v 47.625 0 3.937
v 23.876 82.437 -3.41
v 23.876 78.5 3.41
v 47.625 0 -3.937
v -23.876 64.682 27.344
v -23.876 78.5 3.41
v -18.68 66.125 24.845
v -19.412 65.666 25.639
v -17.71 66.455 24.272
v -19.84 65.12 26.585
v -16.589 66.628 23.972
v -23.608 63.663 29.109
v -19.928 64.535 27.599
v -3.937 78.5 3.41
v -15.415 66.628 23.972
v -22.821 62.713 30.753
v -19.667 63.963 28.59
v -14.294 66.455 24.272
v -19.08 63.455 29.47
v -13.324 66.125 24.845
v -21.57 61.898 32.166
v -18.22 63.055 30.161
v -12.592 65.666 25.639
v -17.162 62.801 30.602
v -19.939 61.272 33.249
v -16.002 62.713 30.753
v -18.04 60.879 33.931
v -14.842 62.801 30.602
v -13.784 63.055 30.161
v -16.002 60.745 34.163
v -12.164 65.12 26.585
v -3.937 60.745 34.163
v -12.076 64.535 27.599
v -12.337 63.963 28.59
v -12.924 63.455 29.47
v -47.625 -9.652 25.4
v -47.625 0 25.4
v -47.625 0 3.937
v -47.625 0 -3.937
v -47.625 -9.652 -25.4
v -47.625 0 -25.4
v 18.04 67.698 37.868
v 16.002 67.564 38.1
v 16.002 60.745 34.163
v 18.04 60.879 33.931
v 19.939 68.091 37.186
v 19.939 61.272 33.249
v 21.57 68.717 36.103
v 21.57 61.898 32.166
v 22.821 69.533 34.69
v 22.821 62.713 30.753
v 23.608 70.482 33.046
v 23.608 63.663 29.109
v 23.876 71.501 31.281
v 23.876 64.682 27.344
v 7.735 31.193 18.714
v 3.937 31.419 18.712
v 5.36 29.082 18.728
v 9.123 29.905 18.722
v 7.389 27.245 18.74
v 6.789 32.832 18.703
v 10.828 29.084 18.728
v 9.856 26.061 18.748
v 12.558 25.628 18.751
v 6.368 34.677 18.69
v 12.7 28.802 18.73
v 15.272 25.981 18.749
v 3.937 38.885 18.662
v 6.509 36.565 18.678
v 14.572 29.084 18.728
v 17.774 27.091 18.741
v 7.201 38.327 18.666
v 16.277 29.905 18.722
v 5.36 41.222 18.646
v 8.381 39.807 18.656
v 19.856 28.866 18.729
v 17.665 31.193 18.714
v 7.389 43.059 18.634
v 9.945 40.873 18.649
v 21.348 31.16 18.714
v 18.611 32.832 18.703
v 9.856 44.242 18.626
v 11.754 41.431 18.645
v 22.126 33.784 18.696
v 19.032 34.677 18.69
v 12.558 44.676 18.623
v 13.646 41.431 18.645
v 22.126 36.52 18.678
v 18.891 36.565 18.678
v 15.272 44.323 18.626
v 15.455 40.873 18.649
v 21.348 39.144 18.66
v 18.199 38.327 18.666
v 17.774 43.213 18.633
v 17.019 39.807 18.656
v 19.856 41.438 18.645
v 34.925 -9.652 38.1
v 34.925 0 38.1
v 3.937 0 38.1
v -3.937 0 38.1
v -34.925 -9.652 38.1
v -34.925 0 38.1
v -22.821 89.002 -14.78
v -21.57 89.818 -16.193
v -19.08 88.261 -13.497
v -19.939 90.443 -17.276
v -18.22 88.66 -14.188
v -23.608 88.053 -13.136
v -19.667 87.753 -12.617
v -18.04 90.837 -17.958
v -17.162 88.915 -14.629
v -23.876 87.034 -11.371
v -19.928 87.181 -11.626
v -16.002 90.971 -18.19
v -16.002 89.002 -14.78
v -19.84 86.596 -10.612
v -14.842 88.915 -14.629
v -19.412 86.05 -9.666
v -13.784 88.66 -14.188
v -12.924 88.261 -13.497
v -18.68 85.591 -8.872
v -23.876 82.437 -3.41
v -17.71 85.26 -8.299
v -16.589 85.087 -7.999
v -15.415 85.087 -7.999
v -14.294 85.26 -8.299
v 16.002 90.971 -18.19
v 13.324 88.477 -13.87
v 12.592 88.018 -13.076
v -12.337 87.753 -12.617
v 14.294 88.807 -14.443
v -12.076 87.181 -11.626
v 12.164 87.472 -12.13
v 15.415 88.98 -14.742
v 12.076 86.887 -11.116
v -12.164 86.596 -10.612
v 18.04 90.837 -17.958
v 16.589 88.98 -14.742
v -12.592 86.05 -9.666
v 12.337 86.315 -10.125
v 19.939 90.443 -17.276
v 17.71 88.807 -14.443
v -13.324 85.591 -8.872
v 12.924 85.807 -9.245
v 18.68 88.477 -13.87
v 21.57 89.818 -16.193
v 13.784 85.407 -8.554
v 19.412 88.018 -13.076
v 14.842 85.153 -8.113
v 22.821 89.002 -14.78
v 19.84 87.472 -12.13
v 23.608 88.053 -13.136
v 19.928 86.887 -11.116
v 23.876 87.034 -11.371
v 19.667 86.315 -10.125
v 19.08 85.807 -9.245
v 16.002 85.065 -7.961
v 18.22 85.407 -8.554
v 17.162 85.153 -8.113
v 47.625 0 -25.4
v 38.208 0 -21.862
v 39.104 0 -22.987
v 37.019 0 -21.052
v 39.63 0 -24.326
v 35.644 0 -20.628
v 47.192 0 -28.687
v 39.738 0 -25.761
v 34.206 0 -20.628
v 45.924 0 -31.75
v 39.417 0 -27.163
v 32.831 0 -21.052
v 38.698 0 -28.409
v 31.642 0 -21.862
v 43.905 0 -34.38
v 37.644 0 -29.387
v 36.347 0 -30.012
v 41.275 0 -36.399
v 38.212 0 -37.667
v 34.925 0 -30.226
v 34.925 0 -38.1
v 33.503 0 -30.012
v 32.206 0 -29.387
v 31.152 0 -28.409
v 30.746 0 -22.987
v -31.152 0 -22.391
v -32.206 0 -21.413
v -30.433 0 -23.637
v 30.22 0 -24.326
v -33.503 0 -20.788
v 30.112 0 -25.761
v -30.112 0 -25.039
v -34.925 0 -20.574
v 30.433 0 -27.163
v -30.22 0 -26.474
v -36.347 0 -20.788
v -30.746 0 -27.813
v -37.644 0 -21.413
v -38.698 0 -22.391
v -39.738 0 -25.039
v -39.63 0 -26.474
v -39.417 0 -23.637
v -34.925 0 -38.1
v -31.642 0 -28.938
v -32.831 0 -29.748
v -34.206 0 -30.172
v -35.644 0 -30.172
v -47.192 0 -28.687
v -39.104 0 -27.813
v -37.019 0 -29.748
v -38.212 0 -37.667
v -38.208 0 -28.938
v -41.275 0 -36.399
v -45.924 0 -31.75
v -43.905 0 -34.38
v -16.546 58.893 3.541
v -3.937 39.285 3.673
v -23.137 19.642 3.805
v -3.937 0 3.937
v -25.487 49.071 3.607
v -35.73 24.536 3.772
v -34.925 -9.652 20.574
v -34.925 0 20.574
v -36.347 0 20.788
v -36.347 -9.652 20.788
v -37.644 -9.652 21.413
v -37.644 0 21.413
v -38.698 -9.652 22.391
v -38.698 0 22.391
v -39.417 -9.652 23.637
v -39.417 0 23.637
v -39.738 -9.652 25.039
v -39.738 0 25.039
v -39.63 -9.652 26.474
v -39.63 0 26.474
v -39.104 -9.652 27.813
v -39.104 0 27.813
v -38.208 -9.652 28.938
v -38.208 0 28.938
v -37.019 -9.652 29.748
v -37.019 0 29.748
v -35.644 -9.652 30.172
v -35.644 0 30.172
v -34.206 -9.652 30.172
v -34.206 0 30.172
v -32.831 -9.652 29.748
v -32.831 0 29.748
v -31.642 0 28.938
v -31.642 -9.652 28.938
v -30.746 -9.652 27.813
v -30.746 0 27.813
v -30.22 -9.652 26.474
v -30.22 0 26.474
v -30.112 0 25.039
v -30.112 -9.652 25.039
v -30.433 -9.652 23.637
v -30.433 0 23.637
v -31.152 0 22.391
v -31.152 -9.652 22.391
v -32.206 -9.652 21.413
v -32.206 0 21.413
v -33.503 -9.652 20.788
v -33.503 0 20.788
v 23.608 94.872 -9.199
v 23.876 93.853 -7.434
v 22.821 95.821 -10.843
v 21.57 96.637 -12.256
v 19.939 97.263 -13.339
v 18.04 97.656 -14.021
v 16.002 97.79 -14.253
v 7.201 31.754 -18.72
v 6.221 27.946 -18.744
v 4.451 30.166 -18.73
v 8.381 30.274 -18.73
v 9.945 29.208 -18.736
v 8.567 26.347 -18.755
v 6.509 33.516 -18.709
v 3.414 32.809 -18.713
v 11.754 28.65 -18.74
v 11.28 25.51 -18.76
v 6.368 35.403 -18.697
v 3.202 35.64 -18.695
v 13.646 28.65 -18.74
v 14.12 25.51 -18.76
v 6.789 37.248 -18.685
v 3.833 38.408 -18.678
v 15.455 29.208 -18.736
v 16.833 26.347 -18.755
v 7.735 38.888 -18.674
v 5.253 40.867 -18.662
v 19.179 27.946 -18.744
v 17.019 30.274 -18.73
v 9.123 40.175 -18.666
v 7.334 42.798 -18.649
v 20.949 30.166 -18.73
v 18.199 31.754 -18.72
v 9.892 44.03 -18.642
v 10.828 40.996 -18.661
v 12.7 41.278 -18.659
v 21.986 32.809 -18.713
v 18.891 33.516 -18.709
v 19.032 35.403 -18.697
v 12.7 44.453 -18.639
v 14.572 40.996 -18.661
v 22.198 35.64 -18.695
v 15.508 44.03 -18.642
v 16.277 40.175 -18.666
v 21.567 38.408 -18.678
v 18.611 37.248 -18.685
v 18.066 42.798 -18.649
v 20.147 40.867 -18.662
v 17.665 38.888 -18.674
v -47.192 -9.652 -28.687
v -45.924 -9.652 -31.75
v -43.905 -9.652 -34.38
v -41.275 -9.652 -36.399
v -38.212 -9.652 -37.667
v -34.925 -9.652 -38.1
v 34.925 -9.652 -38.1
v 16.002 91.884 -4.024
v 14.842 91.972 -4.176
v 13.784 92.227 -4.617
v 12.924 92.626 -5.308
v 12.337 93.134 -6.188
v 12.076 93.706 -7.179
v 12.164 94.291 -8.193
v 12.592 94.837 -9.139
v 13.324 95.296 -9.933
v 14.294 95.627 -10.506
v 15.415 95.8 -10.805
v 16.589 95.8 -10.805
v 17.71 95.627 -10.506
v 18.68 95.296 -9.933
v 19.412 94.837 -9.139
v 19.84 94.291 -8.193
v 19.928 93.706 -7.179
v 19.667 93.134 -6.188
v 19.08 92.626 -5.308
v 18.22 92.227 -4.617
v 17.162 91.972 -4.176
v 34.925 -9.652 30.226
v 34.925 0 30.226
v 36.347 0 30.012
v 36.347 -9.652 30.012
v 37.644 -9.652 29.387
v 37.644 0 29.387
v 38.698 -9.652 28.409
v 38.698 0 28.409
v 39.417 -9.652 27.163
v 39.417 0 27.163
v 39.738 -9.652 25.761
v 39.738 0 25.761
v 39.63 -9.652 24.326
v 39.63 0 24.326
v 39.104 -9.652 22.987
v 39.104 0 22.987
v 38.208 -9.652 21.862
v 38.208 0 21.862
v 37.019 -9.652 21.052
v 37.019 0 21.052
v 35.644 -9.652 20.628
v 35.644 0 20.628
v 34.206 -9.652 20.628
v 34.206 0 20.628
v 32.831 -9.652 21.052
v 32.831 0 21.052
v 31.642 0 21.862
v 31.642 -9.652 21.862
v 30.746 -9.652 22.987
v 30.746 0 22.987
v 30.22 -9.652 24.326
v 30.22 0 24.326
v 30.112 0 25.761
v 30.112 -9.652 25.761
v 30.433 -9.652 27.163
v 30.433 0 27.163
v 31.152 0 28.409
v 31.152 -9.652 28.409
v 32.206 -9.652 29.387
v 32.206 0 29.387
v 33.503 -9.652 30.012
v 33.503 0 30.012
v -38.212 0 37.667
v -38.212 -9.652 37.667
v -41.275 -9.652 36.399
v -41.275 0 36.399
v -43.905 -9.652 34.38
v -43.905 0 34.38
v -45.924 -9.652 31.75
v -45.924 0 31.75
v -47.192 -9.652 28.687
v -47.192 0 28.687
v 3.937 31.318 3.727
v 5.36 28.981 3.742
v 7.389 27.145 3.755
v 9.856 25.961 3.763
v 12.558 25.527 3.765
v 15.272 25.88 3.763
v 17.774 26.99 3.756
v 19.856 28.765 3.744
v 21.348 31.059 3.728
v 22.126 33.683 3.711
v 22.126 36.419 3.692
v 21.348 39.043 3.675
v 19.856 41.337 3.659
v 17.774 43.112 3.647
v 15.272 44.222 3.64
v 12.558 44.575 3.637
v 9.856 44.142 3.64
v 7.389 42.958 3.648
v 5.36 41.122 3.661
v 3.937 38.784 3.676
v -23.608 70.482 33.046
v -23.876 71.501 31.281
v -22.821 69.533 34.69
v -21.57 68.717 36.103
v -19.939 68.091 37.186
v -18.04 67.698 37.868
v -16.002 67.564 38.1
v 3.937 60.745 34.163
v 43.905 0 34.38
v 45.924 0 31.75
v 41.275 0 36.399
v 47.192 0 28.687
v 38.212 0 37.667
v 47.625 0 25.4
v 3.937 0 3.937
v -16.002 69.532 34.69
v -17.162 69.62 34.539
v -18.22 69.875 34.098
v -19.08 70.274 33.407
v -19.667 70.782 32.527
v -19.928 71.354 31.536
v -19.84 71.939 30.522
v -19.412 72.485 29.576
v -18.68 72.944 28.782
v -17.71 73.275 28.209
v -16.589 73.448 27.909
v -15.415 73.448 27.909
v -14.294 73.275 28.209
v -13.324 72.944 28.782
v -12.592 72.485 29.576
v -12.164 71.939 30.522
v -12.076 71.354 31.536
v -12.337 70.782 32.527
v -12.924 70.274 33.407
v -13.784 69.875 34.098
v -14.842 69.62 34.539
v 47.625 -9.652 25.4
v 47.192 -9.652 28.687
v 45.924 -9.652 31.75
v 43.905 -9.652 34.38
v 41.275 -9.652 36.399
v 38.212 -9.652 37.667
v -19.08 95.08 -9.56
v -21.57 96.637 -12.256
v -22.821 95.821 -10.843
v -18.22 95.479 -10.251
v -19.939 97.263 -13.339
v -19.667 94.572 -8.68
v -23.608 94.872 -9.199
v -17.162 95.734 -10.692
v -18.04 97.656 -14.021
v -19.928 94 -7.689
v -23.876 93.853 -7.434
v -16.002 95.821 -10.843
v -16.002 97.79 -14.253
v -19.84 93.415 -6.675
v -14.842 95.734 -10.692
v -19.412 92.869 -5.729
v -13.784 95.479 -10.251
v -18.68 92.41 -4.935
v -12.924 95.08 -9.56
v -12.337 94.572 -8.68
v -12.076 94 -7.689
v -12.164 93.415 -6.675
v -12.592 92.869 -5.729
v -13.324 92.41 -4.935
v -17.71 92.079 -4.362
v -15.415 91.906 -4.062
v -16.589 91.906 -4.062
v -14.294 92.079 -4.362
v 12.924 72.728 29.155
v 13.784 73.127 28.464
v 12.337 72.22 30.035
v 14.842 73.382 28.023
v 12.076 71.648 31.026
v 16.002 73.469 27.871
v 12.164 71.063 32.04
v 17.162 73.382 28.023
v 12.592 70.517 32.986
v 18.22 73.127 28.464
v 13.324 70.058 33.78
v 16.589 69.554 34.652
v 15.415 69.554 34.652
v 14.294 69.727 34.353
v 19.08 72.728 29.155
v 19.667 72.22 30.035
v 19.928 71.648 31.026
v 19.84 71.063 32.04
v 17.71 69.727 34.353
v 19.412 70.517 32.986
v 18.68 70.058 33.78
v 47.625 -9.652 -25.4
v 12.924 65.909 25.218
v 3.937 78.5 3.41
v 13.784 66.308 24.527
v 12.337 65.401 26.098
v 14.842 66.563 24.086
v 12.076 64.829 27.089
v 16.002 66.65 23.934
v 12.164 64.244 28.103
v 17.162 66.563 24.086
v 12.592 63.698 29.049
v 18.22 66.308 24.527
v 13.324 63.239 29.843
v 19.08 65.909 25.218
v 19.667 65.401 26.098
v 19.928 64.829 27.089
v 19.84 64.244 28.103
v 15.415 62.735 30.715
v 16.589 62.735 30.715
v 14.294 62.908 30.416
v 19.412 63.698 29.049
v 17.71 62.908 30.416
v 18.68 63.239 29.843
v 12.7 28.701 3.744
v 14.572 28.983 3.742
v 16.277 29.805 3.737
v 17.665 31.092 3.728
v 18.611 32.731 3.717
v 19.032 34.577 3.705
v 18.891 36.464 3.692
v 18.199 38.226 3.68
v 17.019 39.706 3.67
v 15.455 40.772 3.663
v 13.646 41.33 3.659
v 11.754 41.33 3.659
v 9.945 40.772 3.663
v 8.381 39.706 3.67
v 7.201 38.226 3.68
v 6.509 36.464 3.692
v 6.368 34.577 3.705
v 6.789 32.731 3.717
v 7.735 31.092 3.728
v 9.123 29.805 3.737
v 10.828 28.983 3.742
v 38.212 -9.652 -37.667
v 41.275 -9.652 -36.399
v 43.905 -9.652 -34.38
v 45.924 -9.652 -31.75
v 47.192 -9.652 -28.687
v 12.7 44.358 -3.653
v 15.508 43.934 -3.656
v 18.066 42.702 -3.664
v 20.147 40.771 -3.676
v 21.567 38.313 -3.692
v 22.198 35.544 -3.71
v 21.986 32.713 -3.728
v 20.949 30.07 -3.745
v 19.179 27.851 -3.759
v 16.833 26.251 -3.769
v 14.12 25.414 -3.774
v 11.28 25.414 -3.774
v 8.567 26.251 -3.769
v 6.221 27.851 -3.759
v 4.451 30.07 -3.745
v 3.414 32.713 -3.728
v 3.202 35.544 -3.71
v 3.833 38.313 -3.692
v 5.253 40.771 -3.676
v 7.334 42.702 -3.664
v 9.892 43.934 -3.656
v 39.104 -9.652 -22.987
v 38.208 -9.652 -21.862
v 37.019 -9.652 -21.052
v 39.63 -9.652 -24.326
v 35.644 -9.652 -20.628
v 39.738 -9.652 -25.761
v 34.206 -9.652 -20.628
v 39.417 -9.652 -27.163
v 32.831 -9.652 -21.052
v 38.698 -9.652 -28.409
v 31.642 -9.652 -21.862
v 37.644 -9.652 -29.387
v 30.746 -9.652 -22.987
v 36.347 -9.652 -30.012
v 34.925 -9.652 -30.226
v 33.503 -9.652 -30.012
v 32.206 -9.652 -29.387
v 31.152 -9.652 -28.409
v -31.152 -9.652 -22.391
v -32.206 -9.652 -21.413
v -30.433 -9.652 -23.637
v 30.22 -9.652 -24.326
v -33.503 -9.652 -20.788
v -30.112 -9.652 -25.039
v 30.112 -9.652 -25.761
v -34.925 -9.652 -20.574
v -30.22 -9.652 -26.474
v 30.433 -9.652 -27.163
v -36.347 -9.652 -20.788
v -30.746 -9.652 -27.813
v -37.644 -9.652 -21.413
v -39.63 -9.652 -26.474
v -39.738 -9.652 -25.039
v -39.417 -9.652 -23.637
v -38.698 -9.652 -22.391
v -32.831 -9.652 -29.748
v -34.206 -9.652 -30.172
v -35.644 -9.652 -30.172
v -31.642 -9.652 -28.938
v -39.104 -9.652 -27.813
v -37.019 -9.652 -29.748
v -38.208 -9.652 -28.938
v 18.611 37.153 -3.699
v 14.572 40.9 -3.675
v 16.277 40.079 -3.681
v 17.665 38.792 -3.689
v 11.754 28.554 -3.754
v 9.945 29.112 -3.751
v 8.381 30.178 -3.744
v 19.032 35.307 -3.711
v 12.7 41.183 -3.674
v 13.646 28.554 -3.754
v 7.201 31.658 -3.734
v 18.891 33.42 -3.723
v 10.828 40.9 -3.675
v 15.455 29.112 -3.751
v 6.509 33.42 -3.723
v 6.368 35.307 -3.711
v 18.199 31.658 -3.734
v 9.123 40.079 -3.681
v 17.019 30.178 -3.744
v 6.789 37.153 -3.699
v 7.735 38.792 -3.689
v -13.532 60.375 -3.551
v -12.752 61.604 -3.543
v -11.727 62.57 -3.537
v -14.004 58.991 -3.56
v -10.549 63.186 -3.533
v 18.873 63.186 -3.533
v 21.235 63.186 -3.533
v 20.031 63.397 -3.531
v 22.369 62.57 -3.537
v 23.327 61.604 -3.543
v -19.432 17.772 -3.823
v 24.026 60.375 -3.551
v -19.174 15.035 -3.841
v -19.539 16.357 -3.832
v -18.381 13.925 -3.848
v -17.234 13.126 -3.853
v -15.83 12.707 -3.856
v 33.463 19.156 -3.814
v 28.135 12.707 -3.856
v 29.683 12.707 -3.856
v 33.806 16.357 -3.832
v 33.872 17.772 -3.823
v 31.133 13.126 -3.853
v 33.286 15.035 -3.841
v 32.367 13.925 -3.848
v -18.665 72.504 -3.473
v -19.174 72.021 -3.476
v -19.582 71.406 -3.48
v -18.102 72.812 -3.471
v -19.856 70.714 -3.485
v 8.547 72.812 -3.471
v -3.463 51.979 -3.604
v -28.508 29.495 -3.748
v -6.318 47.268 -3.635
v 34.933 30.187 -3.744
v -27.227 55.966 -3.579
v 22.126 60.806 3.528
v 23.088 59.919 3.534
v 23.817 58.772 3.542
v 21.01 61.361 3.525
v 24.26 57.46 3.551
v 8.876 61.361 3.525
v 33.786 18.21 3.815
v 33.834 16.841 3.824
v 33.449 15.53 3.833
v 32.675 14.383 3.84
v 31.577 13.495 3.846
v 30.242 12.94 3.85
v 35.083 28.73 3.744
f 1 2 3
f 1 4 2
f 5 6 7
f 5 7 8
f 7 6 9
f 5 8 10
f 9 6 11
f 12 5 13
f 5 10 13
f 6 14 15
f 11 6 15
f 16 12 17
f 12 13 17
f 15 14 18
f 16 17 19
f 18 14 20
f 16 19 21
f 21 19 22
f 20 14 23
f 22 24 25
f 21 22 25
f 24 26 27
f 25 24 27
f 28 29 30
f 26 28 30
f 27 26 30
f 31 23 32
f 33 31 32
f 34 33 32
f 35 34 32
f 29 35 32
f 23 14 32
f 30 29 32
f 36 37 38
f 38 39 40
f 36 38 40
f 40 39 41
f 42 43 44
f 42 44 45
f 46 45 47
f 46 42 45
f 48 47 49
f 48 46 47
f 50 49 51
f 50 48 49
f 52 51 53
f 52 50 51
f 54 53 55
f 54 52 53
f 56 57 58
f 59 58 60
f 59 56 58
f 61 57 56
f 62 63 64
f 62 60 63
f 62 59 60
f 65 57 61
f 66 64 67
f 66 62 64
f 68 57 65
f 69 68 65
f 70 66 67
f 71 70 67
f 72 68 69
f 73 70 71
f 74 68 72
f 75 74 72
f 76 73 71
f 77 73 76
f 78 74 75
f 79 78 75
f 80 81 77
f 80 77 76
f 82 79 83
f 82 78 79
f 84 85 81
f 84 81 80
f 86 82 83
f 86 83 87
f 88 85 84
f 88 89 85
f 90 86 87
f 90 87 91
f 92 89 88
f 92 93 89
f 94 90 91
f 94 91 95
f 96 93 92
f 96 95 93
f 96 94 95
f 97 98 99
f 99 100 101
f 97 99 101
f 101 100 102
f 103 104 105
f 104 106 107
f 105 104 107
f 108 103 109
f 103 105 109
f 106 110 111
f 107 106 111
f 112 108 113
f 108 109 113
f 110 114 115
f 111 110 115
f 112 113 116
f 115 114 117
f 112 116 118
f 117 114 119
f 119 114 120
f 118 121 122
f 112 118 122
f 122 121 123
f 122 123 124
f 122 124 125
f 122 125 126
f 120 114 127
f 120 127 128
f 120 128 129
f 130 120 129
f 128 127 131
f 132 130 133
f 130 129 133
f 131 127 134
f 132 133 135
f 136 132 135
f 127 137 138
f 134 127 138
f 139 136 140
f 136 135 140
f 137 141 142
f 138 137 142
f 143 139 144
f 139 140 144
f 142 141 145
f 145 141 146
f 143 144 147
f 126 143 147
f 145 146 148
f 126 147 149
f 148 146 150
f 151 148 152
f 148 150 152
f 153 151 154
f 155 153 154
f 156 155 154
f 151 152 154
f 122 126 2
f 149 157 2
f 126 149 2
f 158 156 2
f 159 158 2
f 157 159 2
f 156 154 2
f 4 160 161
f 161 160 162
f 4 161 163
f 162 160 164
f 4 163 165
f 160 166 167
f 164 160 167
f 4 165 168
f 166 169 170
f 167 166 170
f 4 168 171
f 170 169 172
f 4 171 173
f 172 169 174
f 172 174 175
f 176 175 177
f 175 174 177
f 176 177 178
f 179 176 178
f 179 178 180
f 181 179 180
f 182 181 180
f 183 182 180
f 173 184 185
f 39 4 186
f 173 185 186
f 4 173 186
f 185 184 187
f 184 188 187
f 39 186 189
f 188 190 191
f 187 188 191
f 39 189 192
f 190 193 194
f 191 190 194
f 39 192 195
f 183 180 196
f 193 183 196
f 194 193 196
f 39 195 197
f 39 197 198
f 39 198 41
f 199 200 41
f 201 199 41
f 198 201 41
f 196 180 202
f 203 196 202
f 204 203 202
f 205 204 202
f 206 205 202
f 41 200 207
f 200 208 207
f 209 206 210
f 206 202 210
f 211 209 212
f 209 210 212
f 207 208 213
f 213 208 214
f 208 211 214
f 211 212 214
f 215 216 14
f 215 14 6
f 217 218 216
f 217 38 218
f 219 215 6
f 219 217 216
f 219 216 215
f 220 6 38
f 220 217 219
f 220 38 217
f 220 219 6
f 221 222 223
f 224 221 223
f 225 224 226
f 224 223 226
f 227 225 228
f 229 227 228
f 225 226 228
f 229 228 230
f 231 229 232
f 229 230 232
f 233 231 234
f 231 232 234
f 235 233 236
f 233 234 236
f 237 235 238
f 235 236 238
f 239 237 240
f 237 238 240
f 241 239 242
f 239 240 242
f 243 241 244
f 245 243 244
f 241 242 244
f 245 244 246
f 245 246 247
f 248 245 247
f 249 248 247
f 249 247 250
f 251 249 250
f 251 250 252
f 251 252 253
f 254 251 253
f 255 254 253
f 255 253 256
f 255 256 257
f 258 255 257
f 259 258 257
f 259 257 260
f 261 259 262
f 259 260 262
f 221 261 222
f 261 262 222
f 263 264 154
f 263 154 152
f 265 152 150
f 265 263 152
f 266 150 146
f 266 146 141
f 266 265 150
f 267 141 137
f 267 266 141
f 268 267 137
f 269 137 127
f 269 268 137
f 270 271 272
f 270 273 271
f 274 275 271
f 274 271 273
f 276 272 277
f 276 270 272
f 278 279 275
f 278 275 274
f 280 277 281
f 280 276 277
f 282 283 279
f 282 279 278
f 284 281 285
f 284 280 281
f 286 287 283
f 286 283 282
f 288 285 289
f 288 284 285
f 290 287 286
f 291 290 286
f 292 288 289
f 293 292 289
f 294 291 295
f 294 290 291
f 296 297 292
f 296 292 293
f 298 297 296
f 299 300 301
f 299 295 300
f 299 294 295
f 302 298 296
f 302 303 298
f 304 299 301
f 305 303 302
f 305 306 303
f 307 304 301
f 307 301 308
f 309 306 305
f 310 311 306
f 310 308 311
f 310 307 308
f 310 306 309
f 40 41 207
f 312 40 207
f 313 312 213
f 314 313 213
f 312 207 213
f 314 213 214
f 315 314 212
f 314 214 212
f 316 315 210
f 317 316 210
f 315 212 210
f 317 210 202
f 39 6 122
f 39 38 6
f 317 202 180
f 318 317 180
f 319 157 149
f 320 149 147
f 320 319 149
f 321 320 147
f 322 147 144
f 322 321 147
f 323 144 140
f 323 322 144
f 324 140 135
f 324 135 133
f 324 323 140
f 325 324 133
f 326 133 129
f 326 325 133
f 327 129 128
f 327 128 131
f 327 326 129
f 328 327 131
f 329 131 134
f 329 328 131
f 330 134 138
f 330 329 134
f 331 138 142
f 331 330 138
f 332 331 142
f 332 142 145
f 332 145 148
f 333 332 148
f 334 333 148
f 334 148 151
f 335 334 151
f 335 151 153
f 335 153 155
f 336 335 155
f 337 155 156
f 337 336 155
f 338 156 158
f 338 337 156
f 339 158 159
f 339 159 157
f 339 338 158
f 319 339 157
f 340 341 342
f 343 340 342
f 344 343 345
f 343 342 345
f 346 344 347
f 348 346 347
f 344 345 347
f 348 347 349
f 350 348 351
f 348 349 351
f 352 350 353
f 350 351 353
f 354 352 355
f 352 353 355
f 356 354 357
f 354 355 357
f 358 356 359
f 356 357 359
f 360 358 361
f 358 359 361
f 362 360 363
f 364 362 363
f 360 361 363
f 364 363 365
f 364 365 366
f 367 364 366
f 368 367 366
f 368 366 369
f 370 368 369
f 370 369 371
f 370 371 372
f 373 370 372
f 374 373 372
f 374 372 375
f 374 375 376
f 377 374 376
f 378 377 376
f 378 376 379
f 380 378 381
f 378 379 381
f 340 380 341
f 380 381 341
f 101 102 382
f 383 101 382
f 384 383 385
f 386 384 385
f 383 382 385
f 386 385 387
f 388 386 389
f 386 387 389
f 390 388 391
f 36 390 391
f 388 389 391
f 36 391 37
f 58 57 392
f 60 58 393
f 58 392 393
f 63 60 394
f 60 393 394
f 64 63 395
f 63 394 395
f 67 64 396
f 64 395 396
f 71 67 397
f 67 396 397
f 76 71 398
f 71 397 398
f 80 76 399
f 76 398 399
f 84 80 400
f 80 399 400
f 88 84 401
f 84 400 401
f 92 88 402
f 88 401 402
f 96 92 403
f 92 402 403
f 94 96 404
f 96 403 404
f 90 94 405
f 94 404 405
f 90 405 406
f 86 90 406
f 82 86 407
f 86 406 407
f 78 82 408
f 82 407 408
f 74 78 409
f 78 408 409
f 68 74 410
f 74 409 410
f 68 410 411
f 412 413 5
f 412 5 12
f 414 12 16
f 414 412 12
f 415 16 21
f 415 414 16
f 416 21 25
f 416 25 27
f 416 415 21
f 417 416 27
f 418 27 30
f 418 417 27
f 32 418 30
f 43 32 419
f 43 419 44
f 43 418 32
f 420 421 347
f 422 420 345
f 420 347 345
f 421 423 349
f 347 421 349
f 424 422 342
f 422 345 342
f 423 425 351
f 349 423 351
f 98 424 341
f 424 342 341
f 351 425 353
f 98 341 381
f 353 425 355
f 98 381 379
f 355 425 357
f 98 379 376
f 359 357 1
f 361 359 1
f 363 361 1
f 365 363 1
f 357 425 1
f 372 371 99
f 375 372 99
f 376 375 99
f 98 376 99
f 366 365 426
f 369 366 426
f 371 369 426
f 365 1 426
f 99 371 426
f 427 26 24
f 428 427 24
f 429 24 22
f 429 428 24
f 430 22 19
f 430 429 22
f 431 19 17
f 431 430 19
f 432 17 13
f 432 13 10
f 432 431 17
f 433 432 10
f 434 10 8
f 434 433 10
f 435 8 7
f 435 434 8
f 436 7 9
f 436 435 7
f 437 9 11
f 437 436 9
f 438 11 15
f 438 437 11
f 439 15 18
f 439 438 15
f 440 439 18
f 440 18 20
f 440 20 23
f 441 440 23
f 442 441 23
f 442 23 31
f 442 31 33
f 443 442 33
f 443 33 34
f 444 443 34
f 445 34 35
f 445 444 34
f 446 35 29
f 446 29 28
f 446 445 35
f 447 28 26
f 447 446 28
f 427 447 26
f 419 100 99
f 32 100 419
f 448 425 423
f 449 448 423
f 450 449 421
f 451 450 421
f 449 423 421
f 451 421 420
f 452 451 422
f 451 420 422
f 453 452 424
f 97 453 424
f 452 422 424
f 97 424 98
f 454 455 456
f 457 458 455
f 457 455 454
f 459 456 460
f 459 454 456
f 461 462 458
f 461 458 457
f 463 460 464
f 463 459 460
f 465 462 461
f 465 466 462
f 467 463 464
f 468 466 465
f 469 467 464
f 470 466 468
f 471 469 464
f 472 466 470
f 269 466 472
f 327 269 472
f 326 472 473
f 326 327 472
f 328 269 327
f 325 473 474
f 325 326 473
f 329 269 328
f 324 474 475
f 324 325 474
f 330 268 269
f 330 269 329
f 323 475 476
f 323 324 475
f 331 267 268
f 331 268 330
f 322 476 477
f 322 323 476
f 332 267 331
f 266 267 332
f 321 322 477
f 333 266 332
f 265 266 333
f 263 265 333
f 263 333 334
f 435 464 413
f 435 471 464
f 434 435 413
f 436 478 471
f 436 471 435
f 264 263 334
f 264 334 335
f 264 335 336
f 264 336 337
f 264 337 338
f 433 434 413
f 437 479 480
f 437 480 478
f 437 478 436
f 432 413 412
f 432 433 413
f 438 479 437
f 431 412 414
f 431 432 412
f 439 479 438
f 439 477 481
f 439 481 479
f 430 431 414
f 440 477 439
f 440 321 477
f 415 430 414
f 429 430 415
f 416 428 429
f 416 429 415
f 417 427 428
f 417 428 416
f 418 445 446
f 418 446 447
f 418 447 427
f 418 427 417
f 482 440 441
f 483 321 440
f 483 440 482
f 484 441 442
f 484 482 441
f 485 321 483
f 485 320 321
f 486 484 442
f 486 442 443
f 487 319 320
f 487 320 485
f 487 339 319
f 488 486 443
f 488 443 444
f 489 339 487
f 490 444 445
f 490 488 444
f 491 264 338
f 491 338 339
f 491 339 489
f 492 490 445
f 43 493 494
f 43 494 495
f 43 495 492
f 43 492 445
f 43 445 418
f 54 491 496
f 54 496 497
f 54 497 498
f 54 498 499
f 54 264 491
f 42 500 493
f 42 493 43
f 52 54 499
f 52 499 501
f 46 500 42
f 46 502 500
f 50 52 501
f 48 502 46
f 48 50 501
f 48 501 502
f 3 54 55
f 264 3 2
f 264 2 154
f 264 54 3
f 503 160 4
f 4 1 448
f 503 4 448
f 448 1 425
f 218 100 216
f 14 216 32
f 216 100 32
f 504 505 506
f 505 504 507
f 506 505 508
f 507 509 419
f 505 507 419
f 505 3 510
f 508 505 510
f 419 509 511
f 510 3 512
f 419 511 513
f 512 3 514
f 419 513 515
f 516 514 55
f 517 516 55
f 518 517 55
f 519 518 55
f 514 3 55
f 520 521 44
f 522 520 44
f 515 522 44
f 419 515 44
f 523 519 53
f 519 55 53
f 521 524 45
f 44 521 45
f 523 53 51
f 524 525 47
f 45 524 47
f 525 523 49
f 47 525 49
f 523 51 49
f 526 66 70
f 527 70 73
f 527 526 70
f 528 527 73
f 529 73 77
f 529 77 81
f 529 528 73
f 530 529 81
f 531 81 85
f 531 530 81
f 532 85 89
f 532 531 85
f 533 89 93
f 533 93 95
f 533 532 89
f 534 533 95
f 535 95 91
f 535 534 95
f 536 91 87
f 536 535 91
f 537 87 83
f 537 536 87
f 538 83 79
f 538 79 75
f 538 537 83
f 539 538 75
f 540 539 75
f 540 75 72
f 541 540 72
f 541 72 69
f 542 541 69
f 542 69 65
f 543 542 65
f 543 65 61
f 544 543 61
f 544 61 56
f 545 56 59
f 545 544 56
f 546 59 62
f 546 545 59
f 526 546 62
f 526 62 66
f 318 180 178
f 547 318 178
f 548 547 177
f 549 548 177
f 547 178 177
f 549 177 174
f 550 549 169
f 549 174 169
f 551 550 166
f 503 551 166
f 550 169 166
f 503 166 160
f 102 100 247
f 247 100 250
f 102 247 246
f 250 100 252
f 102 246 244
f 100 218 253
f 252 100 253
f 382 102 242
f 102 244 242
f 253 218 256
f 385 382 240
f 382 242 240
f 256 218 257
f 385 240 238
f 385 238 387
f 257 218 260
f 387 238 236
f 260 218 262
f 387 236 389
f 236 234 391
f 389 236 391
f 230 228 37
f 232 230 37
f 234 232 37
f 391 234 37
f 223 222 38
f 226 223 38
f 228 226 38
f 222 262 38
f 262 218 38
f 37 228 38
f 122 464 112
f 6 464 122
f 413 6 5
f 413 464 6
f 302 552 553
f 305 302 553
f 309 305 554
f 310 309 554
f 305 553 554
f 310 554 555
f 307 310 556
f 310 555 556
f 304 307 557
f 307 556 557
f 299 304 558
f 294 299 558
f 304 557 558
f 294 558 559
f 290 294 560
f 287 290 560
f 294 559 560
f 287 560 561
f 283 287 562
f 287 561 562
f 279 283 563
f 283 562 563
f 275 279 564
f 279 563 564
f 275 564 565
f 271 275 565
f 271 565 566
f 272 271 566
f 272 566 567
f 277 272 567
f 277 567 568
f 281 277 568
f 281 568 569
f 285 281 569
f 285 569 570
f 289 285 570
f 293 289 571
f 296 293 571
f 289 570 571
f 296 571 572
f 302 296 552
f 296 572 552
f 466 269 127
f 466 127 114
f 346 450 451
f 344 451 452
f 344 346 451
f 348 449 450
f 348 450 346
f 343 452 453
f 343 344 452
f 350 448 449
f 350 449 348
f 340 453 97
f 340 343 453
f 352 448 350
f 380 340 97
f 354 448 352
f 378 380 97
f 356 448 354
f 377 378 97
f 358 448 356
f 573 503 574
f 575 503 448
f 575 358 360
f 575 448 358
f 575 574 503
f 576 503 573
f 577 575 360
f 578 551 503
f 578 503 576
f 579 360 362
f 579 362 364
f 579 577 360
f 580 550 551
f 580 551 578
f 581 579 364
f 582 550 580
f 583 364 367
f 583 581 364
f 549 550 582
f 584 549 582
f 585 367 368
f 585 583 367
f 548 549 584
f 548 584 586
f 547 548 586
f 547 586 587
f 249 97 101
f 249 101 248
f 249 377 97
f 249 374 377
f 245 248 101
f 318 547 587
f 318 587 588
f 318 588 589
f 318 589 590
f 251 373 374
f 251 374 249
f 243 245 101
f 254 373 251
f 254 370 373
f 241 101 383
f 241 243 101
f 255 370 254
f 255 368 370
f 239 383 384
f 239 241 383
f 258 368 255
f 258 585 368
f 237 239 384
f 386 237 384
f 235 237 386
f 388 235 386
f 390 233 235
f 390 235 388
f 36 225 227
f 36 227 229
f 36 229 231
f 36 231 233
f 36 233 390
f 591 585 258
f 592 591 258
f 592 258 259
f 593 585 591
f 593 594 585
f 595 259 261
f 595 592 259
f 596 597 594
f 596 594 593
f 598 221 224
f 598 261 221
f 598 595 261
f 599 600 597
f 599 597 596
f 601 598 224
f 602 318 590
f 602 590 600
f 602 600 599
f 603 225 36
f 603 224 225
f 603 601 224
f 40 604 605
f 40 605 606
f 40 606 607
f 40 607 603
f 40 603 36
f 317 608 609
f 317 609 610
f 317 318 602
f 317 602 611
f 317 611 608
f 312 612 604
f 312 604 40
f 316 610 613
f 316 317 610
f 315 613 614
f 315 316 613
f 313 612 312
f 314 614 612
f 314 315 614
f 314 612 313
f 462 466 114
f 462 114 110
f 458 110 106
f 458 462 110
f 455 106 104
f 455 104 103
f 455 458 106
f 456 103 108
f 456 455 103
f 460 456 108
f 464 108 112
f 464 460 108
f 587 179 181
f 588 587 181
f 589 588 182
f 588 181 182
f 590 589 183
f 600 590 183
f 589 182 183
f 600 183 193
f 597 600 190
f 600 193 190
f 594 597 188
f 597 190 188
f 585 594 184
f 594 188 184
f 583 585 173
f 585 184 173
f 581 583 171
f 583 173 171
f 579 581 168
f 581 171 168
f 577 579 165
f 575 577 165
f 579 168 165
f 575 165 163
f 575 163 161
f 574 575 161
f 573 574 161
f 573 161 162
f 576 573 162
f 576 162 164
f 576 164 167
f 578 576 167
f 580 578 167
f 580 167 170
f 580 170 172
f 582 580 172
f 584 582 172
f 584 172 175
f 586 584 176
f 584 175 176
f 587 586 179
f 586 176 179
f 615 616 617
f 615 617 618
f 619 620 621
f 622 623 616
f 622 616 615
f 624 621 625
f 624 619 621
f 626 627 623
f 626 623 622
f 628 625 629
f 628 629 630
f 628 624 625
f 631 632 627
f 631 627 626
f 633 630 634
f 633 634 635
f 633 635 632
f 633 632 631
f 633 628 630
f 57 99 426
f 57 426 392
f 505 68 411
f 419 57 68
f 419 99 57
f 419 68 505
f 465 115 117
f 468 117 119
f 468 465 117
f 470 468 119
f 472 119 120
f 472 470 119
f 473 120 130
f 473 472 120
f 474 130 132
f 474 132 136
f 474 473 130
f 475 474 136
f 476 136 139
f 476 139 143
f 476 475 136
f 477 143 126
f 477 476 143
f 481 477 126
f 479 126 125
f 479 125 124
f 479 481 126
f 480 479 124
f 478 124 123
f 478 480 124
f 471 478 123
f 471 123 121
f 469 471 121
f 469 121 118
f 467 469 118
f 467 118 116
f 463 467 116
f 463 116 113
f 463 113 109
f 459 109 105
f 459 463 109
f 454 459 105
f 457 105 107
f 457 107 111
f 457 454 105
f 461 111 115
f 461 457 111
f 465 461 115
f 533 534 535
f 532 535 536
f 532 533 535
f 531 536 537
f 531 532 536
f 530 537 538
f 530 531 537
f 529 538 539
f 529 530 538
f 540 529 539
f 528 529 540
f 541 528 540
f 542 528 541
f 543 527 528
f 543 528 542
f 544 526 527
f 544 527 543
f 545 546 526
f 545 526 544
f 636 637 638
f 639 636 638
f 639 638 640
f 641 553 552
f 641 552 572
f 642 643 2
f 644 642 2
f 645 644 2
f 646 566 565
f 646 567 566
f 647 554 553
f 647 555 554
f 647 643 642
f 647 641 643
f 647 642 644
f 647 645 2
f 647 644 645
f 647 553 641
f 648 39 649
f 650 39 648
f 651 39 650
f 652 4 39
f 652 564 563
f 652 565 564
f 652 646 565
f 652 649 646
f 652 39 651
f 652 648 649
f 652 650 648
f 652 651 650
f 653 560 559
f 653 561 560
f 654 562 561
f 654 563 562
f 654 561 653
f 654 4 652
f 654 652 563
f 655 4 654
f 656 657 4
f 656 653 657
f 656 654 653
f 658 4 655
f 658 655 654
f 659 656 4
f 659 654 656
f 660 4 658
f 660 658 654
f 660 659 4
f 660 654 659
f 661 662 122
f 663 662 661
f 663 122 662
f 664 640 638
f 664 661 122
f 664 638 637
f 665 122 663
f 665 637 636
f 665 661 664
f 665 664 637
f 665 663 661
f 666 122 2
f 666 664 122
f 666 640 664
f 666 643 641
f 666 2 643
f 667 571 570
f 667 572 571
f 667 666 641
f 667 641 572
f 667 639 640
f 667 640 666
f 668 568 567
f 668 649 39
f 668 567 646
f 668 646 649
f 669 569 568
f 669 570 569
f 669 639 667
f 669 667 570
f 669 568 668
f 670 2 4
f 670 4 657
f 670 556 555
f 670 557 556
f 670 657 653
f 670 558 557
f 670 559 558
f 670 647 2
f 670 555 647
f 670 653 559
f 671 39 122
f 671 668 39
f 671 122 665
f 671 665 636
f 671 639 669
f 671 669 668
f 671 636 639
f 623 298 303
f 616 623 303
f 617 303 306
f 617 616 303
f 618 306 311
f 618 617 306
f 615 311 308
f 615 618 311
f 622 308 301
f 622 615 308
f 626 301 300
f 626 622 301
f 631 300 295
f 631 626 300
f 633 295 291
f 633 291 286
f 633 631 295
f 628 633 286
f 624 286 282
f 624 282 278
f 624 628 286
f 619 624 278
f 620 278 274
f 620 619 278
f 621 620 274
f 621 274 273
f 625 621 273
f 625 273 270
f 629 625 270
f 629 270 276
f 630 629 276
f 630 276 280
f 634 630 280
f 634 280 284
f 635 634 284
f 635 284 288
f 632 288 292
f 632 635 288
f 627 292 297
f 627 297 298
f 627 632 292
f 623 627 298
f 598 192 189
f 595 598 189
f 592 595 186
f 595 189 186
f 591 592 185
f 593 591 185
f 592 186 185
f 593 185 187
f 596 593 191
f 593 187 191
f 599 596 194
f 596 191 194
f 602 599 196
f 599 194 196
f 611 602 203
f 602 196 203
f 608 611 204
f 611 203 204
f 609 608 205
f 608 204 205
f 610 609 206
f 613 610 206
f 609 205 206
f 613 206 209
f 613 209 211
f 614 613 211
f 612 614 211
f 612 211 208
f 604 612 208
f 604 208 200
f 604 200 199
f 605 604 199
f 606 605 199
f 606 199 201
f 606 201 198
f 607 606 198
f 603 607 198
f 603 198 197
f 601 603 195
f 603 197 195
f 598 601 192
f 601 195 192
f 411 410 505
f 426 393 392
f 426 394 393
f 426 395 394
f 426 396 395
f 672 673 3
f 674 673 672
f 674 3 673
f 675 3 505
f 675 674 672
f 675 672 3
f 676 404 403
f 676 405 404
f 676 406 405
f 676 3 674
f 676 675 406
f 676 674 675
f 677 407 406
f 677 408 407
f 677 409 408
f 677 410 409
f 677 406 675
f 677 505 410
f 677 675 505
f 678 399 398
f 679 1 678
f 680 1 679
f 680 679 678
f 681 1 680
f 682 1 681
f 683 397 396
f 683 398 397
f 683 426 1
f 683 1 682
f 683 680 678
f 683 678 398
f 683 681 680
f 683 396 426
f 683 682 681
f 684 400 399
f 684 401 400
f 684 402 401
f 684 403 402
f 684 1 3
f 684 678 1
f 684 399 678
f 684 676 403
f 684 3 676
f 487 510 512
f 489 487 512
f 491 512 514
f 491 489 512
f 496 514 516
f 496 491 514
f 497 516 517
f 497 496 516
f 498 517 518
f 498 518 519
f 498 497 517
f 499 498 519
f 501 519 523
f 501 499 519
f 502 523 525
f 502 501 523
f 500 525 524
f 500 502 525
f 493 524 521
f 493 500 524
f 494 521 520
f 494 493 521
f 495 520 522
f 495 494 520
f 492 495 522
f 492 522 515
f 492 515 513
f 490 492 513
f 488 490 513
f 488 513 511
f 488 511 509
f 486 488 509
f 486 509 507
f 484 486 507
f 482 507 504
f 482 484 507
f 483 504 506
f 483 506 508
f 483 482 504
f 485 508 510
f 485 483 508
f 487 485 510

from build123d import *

# Parameters (mm, degrees)
SKETCH7_R           = 4.826
BOSS_EXTRUDE2_DEPTH = 9.652
SKETCH11_R          = 3.937
BOSS_EXTRUDE3_DEPTH = 7.874
RIB1_REACH          = 117.25
SKETCH16_WALL_W     = 293.372991472
SKETCH16_WALL_H     = 7.874
SKETCH17_R          = 9.525
SKETCH17_R_2        = 6.35
BOSS_EXTRUDE4_DEPTH = 14.986
SKETCH18_R          = 9.525
SKETCH18_R_2        = 6.35
BOSS_EXTRUDE5_DEPTH = 14.986


with BuildPart() as part:
    # Sketch7 → Boss-Extrude2 (new body)
    with BuildSketch(Plane(origin=(0, 0, 0), x_dir=(1, 0, 0), z_dir=(0, 1, 0))):
        with BuildLine():
            Line((-34.925, 38.1), (34.925, 38.1))
            ThreePointArc((34.925, 38.1), (43.905256121, 34.380256121), (47.625, 25.4))
            Line((47.625, 25.4), (47.625, -25.4))
            ThreePointArc((47.625, -25.4), (43.905256121, -34.380256121), (34.925, -38.1))
            Line((34.925, -38.1), (-34.925, -38.1))
            ThreePointArc((-34.925, -38.1), (-43.905256121, -34.380256121), (-47.625, -25.4))
            Line((-47.625, -25.4), (-47.625, 25.4))
            ThreePointArc((-47.625, 25.4), (-43.905256121, 34.380256121), (-34.925, 38.1))
        make_face()
        with Locations(Location((-34.925, 25.4, 0), (0, 0, 270))):
            Circle(SKETCH7_R, mode=Mode.SUBTRACT)
        with Locations(Location((34.925, 25.4, 0), (0, 0, 90))):
            Circle(SKETCH7_R, mode=Mode.SUBTRACT)
        with Locations(Location((34.925, -25.4, 0), (0, 0, 270))):
            Circle(SKETCH7_R, mode=Mode.SUBTRACT)
        with Locations(Location((-34.925, -25.4, 0), (0, 0, 90))):
            Circle(SKETCH7_R, mode=Mode.SUBTRACT)
    extrude(amount=-BOSS_EXTRUDE2_DEPTH)



with BuildPart() as body_2:
    # Sketch11 → Boss-Extrude3 (new body)
    with BuildSketch(Plane(origin=(0, 67.170783942, 38.781070191), x_dir=(0, 0.4999999999999983, -0.8660254037844396), z_dir=(0, -0.8660254037844396, -0.4999999999999983))):
        with BuildLine():
            Line((53.364432116, -23.876), (8.660432116, -23.876))
            ThreePointArc((8.660432116, -23.876), (3.092673321, -21.569758795), (0.786432116, -16.002))
            Line((0.786432116, -16.002), (0.786432116, 16.002))
            ThreePointArc((0.786432116, 16.002), (3.092673321, 21.569758795), (8.660432116, 23.876))
            Line((8.660432116, 23.876), (53.364432116, 23.876))
            ThreePointArc((53.364432116, 23.876), (58.932190911, 21.569758795), (61.238432116, 16.002))
            Line((61.238432116, 16.002), (61.238432116, -16.002))
            ThreePointArc((61.238432116, -16.002), (58.932190911, -21.569758795), (53.364432116, -23.876))
        make_face()
        with Locations((53.364432116, -16.002)):
            Circle(SKETCH11_R, mode=Mode.SUBTRACT)
        with Locations(Location((8.660432116, -16.002, 0), (0, 0, 180))):
            Circle(SKETCH11_R, mode=Mode.SUBTRACT)
        with Locations(Location((53.364432116, 16.002, 0), (0, 0, 180))):
            Circle(SKETCH11_R, mode=Mode.SUBTRACT)
        with Locations((8.660432116, 16.002)):
            Circle(SKETCH11_R, mode=Mode.SUBTRACT)
    extrude(amount=BOSS_EXTRUDE3_DEPTH)


with BuildPart() as part_1:
    add(part.part)

    add(body_2.part)  # Loft1 merges body 2
    # Sketch15 → Loft1 section 0
    with BuildSketch(Plane(origin=(0, 60.351699913, 34.844070191), x_dir=(1, 0, 0), z_dir=(0, -0.8660254037844397, -0.4999999999999983))):
        with BuildLine():
            Line((23.876, -36.297466608), (-23.876, -36.297466608))
            Line((-23.876, -36.297466608), (-23.876, -44.171466608))
            Line((-23.876, -44.171466608), (23.876, -44.171466608))
            Line((23.876, -44.171466608), (23.876, -36.297466608))
        make_face()
    # Sketch12 → Loft1 section 1
    with BuildSketch(Plane(origin=(0, 0, 0), x_dir=(1, 0, 0), z_dir=(0, 1, 0))):
        with BuildLine():
            Line((-47.625, 3.937), (47.625, 3.937))
            Line((47.625, 3.937), (47.625, -3.937))
            Line((47.625, -3.937), (-47.625, -3.937))
            Line((-47.625, -3.937), (-47.625, 3.937))
        make_face()
    loft()

    # Sketch16 wall → Rib1 (add, up to next)
    with BuildSketch(Plane(origin=(0, 30.372457985, 36.1315), x_dir=(0, 0.997906295589, -0.064676311144), z_dir=(0, 0.064676311144, 0.997906295589)), mode=Mode.PRIVATE) as rib1_sk1:
        Rectangle(SKETCH16_WALL_W, SKETCH16_WALL_H)
    rib1_tool1 = extrude(rib1_sk1.sketch, amount=-RIB1_REACH, mode=Mode.PRIVATE) - part_1.part
    add(rib1_tool1.solids().sort_by_distance((0, 30.372457985, 36.1315))[0])

    # Sketch17 → Boss-Extrude4 (add)
    with BuildSketch(Plane(origin=(0, 0.02645219, 3.936822263), x_dir=(1, 0, 0), z_dir=(0, 0.0067190212517474575, 0.9999774271219419))):
        with Locations((12.7, 35.025547213)):
            Circle(SKETCH17_R)
        with Locations(Location((12.7, 35.025547213, 0), (0, 0, 270))):
            Circle(SKETCH17_R_2, mode=Mode.SUBTRACT)
    extrude(amount=BOSS_EXTRUDE4_DEPTH)

    # Sketch18 → Boss-Extrude5 (add)
    with BuildSketch(Plane(origin=(0, 0.025189007, -3.936838834), x_dir=(-1, 0, 0), z_dir=(0, 0.006398151525432763, -0.9999795316190516))):
        with Locations(Location((-12.7, 34.808230427, 0), (0, 0, 90))):
            Circle(SKETCH18_R)
        with Locations(Location((-12.7, 34.808230427, 0), (0, 0, 90))):
            Circle(SKETCH18_R_2, mode=Mode.SUBTRACT)
    extrude(amount=BOSS_EXTRUDE5_DEPTH)


solid = part_1.part
